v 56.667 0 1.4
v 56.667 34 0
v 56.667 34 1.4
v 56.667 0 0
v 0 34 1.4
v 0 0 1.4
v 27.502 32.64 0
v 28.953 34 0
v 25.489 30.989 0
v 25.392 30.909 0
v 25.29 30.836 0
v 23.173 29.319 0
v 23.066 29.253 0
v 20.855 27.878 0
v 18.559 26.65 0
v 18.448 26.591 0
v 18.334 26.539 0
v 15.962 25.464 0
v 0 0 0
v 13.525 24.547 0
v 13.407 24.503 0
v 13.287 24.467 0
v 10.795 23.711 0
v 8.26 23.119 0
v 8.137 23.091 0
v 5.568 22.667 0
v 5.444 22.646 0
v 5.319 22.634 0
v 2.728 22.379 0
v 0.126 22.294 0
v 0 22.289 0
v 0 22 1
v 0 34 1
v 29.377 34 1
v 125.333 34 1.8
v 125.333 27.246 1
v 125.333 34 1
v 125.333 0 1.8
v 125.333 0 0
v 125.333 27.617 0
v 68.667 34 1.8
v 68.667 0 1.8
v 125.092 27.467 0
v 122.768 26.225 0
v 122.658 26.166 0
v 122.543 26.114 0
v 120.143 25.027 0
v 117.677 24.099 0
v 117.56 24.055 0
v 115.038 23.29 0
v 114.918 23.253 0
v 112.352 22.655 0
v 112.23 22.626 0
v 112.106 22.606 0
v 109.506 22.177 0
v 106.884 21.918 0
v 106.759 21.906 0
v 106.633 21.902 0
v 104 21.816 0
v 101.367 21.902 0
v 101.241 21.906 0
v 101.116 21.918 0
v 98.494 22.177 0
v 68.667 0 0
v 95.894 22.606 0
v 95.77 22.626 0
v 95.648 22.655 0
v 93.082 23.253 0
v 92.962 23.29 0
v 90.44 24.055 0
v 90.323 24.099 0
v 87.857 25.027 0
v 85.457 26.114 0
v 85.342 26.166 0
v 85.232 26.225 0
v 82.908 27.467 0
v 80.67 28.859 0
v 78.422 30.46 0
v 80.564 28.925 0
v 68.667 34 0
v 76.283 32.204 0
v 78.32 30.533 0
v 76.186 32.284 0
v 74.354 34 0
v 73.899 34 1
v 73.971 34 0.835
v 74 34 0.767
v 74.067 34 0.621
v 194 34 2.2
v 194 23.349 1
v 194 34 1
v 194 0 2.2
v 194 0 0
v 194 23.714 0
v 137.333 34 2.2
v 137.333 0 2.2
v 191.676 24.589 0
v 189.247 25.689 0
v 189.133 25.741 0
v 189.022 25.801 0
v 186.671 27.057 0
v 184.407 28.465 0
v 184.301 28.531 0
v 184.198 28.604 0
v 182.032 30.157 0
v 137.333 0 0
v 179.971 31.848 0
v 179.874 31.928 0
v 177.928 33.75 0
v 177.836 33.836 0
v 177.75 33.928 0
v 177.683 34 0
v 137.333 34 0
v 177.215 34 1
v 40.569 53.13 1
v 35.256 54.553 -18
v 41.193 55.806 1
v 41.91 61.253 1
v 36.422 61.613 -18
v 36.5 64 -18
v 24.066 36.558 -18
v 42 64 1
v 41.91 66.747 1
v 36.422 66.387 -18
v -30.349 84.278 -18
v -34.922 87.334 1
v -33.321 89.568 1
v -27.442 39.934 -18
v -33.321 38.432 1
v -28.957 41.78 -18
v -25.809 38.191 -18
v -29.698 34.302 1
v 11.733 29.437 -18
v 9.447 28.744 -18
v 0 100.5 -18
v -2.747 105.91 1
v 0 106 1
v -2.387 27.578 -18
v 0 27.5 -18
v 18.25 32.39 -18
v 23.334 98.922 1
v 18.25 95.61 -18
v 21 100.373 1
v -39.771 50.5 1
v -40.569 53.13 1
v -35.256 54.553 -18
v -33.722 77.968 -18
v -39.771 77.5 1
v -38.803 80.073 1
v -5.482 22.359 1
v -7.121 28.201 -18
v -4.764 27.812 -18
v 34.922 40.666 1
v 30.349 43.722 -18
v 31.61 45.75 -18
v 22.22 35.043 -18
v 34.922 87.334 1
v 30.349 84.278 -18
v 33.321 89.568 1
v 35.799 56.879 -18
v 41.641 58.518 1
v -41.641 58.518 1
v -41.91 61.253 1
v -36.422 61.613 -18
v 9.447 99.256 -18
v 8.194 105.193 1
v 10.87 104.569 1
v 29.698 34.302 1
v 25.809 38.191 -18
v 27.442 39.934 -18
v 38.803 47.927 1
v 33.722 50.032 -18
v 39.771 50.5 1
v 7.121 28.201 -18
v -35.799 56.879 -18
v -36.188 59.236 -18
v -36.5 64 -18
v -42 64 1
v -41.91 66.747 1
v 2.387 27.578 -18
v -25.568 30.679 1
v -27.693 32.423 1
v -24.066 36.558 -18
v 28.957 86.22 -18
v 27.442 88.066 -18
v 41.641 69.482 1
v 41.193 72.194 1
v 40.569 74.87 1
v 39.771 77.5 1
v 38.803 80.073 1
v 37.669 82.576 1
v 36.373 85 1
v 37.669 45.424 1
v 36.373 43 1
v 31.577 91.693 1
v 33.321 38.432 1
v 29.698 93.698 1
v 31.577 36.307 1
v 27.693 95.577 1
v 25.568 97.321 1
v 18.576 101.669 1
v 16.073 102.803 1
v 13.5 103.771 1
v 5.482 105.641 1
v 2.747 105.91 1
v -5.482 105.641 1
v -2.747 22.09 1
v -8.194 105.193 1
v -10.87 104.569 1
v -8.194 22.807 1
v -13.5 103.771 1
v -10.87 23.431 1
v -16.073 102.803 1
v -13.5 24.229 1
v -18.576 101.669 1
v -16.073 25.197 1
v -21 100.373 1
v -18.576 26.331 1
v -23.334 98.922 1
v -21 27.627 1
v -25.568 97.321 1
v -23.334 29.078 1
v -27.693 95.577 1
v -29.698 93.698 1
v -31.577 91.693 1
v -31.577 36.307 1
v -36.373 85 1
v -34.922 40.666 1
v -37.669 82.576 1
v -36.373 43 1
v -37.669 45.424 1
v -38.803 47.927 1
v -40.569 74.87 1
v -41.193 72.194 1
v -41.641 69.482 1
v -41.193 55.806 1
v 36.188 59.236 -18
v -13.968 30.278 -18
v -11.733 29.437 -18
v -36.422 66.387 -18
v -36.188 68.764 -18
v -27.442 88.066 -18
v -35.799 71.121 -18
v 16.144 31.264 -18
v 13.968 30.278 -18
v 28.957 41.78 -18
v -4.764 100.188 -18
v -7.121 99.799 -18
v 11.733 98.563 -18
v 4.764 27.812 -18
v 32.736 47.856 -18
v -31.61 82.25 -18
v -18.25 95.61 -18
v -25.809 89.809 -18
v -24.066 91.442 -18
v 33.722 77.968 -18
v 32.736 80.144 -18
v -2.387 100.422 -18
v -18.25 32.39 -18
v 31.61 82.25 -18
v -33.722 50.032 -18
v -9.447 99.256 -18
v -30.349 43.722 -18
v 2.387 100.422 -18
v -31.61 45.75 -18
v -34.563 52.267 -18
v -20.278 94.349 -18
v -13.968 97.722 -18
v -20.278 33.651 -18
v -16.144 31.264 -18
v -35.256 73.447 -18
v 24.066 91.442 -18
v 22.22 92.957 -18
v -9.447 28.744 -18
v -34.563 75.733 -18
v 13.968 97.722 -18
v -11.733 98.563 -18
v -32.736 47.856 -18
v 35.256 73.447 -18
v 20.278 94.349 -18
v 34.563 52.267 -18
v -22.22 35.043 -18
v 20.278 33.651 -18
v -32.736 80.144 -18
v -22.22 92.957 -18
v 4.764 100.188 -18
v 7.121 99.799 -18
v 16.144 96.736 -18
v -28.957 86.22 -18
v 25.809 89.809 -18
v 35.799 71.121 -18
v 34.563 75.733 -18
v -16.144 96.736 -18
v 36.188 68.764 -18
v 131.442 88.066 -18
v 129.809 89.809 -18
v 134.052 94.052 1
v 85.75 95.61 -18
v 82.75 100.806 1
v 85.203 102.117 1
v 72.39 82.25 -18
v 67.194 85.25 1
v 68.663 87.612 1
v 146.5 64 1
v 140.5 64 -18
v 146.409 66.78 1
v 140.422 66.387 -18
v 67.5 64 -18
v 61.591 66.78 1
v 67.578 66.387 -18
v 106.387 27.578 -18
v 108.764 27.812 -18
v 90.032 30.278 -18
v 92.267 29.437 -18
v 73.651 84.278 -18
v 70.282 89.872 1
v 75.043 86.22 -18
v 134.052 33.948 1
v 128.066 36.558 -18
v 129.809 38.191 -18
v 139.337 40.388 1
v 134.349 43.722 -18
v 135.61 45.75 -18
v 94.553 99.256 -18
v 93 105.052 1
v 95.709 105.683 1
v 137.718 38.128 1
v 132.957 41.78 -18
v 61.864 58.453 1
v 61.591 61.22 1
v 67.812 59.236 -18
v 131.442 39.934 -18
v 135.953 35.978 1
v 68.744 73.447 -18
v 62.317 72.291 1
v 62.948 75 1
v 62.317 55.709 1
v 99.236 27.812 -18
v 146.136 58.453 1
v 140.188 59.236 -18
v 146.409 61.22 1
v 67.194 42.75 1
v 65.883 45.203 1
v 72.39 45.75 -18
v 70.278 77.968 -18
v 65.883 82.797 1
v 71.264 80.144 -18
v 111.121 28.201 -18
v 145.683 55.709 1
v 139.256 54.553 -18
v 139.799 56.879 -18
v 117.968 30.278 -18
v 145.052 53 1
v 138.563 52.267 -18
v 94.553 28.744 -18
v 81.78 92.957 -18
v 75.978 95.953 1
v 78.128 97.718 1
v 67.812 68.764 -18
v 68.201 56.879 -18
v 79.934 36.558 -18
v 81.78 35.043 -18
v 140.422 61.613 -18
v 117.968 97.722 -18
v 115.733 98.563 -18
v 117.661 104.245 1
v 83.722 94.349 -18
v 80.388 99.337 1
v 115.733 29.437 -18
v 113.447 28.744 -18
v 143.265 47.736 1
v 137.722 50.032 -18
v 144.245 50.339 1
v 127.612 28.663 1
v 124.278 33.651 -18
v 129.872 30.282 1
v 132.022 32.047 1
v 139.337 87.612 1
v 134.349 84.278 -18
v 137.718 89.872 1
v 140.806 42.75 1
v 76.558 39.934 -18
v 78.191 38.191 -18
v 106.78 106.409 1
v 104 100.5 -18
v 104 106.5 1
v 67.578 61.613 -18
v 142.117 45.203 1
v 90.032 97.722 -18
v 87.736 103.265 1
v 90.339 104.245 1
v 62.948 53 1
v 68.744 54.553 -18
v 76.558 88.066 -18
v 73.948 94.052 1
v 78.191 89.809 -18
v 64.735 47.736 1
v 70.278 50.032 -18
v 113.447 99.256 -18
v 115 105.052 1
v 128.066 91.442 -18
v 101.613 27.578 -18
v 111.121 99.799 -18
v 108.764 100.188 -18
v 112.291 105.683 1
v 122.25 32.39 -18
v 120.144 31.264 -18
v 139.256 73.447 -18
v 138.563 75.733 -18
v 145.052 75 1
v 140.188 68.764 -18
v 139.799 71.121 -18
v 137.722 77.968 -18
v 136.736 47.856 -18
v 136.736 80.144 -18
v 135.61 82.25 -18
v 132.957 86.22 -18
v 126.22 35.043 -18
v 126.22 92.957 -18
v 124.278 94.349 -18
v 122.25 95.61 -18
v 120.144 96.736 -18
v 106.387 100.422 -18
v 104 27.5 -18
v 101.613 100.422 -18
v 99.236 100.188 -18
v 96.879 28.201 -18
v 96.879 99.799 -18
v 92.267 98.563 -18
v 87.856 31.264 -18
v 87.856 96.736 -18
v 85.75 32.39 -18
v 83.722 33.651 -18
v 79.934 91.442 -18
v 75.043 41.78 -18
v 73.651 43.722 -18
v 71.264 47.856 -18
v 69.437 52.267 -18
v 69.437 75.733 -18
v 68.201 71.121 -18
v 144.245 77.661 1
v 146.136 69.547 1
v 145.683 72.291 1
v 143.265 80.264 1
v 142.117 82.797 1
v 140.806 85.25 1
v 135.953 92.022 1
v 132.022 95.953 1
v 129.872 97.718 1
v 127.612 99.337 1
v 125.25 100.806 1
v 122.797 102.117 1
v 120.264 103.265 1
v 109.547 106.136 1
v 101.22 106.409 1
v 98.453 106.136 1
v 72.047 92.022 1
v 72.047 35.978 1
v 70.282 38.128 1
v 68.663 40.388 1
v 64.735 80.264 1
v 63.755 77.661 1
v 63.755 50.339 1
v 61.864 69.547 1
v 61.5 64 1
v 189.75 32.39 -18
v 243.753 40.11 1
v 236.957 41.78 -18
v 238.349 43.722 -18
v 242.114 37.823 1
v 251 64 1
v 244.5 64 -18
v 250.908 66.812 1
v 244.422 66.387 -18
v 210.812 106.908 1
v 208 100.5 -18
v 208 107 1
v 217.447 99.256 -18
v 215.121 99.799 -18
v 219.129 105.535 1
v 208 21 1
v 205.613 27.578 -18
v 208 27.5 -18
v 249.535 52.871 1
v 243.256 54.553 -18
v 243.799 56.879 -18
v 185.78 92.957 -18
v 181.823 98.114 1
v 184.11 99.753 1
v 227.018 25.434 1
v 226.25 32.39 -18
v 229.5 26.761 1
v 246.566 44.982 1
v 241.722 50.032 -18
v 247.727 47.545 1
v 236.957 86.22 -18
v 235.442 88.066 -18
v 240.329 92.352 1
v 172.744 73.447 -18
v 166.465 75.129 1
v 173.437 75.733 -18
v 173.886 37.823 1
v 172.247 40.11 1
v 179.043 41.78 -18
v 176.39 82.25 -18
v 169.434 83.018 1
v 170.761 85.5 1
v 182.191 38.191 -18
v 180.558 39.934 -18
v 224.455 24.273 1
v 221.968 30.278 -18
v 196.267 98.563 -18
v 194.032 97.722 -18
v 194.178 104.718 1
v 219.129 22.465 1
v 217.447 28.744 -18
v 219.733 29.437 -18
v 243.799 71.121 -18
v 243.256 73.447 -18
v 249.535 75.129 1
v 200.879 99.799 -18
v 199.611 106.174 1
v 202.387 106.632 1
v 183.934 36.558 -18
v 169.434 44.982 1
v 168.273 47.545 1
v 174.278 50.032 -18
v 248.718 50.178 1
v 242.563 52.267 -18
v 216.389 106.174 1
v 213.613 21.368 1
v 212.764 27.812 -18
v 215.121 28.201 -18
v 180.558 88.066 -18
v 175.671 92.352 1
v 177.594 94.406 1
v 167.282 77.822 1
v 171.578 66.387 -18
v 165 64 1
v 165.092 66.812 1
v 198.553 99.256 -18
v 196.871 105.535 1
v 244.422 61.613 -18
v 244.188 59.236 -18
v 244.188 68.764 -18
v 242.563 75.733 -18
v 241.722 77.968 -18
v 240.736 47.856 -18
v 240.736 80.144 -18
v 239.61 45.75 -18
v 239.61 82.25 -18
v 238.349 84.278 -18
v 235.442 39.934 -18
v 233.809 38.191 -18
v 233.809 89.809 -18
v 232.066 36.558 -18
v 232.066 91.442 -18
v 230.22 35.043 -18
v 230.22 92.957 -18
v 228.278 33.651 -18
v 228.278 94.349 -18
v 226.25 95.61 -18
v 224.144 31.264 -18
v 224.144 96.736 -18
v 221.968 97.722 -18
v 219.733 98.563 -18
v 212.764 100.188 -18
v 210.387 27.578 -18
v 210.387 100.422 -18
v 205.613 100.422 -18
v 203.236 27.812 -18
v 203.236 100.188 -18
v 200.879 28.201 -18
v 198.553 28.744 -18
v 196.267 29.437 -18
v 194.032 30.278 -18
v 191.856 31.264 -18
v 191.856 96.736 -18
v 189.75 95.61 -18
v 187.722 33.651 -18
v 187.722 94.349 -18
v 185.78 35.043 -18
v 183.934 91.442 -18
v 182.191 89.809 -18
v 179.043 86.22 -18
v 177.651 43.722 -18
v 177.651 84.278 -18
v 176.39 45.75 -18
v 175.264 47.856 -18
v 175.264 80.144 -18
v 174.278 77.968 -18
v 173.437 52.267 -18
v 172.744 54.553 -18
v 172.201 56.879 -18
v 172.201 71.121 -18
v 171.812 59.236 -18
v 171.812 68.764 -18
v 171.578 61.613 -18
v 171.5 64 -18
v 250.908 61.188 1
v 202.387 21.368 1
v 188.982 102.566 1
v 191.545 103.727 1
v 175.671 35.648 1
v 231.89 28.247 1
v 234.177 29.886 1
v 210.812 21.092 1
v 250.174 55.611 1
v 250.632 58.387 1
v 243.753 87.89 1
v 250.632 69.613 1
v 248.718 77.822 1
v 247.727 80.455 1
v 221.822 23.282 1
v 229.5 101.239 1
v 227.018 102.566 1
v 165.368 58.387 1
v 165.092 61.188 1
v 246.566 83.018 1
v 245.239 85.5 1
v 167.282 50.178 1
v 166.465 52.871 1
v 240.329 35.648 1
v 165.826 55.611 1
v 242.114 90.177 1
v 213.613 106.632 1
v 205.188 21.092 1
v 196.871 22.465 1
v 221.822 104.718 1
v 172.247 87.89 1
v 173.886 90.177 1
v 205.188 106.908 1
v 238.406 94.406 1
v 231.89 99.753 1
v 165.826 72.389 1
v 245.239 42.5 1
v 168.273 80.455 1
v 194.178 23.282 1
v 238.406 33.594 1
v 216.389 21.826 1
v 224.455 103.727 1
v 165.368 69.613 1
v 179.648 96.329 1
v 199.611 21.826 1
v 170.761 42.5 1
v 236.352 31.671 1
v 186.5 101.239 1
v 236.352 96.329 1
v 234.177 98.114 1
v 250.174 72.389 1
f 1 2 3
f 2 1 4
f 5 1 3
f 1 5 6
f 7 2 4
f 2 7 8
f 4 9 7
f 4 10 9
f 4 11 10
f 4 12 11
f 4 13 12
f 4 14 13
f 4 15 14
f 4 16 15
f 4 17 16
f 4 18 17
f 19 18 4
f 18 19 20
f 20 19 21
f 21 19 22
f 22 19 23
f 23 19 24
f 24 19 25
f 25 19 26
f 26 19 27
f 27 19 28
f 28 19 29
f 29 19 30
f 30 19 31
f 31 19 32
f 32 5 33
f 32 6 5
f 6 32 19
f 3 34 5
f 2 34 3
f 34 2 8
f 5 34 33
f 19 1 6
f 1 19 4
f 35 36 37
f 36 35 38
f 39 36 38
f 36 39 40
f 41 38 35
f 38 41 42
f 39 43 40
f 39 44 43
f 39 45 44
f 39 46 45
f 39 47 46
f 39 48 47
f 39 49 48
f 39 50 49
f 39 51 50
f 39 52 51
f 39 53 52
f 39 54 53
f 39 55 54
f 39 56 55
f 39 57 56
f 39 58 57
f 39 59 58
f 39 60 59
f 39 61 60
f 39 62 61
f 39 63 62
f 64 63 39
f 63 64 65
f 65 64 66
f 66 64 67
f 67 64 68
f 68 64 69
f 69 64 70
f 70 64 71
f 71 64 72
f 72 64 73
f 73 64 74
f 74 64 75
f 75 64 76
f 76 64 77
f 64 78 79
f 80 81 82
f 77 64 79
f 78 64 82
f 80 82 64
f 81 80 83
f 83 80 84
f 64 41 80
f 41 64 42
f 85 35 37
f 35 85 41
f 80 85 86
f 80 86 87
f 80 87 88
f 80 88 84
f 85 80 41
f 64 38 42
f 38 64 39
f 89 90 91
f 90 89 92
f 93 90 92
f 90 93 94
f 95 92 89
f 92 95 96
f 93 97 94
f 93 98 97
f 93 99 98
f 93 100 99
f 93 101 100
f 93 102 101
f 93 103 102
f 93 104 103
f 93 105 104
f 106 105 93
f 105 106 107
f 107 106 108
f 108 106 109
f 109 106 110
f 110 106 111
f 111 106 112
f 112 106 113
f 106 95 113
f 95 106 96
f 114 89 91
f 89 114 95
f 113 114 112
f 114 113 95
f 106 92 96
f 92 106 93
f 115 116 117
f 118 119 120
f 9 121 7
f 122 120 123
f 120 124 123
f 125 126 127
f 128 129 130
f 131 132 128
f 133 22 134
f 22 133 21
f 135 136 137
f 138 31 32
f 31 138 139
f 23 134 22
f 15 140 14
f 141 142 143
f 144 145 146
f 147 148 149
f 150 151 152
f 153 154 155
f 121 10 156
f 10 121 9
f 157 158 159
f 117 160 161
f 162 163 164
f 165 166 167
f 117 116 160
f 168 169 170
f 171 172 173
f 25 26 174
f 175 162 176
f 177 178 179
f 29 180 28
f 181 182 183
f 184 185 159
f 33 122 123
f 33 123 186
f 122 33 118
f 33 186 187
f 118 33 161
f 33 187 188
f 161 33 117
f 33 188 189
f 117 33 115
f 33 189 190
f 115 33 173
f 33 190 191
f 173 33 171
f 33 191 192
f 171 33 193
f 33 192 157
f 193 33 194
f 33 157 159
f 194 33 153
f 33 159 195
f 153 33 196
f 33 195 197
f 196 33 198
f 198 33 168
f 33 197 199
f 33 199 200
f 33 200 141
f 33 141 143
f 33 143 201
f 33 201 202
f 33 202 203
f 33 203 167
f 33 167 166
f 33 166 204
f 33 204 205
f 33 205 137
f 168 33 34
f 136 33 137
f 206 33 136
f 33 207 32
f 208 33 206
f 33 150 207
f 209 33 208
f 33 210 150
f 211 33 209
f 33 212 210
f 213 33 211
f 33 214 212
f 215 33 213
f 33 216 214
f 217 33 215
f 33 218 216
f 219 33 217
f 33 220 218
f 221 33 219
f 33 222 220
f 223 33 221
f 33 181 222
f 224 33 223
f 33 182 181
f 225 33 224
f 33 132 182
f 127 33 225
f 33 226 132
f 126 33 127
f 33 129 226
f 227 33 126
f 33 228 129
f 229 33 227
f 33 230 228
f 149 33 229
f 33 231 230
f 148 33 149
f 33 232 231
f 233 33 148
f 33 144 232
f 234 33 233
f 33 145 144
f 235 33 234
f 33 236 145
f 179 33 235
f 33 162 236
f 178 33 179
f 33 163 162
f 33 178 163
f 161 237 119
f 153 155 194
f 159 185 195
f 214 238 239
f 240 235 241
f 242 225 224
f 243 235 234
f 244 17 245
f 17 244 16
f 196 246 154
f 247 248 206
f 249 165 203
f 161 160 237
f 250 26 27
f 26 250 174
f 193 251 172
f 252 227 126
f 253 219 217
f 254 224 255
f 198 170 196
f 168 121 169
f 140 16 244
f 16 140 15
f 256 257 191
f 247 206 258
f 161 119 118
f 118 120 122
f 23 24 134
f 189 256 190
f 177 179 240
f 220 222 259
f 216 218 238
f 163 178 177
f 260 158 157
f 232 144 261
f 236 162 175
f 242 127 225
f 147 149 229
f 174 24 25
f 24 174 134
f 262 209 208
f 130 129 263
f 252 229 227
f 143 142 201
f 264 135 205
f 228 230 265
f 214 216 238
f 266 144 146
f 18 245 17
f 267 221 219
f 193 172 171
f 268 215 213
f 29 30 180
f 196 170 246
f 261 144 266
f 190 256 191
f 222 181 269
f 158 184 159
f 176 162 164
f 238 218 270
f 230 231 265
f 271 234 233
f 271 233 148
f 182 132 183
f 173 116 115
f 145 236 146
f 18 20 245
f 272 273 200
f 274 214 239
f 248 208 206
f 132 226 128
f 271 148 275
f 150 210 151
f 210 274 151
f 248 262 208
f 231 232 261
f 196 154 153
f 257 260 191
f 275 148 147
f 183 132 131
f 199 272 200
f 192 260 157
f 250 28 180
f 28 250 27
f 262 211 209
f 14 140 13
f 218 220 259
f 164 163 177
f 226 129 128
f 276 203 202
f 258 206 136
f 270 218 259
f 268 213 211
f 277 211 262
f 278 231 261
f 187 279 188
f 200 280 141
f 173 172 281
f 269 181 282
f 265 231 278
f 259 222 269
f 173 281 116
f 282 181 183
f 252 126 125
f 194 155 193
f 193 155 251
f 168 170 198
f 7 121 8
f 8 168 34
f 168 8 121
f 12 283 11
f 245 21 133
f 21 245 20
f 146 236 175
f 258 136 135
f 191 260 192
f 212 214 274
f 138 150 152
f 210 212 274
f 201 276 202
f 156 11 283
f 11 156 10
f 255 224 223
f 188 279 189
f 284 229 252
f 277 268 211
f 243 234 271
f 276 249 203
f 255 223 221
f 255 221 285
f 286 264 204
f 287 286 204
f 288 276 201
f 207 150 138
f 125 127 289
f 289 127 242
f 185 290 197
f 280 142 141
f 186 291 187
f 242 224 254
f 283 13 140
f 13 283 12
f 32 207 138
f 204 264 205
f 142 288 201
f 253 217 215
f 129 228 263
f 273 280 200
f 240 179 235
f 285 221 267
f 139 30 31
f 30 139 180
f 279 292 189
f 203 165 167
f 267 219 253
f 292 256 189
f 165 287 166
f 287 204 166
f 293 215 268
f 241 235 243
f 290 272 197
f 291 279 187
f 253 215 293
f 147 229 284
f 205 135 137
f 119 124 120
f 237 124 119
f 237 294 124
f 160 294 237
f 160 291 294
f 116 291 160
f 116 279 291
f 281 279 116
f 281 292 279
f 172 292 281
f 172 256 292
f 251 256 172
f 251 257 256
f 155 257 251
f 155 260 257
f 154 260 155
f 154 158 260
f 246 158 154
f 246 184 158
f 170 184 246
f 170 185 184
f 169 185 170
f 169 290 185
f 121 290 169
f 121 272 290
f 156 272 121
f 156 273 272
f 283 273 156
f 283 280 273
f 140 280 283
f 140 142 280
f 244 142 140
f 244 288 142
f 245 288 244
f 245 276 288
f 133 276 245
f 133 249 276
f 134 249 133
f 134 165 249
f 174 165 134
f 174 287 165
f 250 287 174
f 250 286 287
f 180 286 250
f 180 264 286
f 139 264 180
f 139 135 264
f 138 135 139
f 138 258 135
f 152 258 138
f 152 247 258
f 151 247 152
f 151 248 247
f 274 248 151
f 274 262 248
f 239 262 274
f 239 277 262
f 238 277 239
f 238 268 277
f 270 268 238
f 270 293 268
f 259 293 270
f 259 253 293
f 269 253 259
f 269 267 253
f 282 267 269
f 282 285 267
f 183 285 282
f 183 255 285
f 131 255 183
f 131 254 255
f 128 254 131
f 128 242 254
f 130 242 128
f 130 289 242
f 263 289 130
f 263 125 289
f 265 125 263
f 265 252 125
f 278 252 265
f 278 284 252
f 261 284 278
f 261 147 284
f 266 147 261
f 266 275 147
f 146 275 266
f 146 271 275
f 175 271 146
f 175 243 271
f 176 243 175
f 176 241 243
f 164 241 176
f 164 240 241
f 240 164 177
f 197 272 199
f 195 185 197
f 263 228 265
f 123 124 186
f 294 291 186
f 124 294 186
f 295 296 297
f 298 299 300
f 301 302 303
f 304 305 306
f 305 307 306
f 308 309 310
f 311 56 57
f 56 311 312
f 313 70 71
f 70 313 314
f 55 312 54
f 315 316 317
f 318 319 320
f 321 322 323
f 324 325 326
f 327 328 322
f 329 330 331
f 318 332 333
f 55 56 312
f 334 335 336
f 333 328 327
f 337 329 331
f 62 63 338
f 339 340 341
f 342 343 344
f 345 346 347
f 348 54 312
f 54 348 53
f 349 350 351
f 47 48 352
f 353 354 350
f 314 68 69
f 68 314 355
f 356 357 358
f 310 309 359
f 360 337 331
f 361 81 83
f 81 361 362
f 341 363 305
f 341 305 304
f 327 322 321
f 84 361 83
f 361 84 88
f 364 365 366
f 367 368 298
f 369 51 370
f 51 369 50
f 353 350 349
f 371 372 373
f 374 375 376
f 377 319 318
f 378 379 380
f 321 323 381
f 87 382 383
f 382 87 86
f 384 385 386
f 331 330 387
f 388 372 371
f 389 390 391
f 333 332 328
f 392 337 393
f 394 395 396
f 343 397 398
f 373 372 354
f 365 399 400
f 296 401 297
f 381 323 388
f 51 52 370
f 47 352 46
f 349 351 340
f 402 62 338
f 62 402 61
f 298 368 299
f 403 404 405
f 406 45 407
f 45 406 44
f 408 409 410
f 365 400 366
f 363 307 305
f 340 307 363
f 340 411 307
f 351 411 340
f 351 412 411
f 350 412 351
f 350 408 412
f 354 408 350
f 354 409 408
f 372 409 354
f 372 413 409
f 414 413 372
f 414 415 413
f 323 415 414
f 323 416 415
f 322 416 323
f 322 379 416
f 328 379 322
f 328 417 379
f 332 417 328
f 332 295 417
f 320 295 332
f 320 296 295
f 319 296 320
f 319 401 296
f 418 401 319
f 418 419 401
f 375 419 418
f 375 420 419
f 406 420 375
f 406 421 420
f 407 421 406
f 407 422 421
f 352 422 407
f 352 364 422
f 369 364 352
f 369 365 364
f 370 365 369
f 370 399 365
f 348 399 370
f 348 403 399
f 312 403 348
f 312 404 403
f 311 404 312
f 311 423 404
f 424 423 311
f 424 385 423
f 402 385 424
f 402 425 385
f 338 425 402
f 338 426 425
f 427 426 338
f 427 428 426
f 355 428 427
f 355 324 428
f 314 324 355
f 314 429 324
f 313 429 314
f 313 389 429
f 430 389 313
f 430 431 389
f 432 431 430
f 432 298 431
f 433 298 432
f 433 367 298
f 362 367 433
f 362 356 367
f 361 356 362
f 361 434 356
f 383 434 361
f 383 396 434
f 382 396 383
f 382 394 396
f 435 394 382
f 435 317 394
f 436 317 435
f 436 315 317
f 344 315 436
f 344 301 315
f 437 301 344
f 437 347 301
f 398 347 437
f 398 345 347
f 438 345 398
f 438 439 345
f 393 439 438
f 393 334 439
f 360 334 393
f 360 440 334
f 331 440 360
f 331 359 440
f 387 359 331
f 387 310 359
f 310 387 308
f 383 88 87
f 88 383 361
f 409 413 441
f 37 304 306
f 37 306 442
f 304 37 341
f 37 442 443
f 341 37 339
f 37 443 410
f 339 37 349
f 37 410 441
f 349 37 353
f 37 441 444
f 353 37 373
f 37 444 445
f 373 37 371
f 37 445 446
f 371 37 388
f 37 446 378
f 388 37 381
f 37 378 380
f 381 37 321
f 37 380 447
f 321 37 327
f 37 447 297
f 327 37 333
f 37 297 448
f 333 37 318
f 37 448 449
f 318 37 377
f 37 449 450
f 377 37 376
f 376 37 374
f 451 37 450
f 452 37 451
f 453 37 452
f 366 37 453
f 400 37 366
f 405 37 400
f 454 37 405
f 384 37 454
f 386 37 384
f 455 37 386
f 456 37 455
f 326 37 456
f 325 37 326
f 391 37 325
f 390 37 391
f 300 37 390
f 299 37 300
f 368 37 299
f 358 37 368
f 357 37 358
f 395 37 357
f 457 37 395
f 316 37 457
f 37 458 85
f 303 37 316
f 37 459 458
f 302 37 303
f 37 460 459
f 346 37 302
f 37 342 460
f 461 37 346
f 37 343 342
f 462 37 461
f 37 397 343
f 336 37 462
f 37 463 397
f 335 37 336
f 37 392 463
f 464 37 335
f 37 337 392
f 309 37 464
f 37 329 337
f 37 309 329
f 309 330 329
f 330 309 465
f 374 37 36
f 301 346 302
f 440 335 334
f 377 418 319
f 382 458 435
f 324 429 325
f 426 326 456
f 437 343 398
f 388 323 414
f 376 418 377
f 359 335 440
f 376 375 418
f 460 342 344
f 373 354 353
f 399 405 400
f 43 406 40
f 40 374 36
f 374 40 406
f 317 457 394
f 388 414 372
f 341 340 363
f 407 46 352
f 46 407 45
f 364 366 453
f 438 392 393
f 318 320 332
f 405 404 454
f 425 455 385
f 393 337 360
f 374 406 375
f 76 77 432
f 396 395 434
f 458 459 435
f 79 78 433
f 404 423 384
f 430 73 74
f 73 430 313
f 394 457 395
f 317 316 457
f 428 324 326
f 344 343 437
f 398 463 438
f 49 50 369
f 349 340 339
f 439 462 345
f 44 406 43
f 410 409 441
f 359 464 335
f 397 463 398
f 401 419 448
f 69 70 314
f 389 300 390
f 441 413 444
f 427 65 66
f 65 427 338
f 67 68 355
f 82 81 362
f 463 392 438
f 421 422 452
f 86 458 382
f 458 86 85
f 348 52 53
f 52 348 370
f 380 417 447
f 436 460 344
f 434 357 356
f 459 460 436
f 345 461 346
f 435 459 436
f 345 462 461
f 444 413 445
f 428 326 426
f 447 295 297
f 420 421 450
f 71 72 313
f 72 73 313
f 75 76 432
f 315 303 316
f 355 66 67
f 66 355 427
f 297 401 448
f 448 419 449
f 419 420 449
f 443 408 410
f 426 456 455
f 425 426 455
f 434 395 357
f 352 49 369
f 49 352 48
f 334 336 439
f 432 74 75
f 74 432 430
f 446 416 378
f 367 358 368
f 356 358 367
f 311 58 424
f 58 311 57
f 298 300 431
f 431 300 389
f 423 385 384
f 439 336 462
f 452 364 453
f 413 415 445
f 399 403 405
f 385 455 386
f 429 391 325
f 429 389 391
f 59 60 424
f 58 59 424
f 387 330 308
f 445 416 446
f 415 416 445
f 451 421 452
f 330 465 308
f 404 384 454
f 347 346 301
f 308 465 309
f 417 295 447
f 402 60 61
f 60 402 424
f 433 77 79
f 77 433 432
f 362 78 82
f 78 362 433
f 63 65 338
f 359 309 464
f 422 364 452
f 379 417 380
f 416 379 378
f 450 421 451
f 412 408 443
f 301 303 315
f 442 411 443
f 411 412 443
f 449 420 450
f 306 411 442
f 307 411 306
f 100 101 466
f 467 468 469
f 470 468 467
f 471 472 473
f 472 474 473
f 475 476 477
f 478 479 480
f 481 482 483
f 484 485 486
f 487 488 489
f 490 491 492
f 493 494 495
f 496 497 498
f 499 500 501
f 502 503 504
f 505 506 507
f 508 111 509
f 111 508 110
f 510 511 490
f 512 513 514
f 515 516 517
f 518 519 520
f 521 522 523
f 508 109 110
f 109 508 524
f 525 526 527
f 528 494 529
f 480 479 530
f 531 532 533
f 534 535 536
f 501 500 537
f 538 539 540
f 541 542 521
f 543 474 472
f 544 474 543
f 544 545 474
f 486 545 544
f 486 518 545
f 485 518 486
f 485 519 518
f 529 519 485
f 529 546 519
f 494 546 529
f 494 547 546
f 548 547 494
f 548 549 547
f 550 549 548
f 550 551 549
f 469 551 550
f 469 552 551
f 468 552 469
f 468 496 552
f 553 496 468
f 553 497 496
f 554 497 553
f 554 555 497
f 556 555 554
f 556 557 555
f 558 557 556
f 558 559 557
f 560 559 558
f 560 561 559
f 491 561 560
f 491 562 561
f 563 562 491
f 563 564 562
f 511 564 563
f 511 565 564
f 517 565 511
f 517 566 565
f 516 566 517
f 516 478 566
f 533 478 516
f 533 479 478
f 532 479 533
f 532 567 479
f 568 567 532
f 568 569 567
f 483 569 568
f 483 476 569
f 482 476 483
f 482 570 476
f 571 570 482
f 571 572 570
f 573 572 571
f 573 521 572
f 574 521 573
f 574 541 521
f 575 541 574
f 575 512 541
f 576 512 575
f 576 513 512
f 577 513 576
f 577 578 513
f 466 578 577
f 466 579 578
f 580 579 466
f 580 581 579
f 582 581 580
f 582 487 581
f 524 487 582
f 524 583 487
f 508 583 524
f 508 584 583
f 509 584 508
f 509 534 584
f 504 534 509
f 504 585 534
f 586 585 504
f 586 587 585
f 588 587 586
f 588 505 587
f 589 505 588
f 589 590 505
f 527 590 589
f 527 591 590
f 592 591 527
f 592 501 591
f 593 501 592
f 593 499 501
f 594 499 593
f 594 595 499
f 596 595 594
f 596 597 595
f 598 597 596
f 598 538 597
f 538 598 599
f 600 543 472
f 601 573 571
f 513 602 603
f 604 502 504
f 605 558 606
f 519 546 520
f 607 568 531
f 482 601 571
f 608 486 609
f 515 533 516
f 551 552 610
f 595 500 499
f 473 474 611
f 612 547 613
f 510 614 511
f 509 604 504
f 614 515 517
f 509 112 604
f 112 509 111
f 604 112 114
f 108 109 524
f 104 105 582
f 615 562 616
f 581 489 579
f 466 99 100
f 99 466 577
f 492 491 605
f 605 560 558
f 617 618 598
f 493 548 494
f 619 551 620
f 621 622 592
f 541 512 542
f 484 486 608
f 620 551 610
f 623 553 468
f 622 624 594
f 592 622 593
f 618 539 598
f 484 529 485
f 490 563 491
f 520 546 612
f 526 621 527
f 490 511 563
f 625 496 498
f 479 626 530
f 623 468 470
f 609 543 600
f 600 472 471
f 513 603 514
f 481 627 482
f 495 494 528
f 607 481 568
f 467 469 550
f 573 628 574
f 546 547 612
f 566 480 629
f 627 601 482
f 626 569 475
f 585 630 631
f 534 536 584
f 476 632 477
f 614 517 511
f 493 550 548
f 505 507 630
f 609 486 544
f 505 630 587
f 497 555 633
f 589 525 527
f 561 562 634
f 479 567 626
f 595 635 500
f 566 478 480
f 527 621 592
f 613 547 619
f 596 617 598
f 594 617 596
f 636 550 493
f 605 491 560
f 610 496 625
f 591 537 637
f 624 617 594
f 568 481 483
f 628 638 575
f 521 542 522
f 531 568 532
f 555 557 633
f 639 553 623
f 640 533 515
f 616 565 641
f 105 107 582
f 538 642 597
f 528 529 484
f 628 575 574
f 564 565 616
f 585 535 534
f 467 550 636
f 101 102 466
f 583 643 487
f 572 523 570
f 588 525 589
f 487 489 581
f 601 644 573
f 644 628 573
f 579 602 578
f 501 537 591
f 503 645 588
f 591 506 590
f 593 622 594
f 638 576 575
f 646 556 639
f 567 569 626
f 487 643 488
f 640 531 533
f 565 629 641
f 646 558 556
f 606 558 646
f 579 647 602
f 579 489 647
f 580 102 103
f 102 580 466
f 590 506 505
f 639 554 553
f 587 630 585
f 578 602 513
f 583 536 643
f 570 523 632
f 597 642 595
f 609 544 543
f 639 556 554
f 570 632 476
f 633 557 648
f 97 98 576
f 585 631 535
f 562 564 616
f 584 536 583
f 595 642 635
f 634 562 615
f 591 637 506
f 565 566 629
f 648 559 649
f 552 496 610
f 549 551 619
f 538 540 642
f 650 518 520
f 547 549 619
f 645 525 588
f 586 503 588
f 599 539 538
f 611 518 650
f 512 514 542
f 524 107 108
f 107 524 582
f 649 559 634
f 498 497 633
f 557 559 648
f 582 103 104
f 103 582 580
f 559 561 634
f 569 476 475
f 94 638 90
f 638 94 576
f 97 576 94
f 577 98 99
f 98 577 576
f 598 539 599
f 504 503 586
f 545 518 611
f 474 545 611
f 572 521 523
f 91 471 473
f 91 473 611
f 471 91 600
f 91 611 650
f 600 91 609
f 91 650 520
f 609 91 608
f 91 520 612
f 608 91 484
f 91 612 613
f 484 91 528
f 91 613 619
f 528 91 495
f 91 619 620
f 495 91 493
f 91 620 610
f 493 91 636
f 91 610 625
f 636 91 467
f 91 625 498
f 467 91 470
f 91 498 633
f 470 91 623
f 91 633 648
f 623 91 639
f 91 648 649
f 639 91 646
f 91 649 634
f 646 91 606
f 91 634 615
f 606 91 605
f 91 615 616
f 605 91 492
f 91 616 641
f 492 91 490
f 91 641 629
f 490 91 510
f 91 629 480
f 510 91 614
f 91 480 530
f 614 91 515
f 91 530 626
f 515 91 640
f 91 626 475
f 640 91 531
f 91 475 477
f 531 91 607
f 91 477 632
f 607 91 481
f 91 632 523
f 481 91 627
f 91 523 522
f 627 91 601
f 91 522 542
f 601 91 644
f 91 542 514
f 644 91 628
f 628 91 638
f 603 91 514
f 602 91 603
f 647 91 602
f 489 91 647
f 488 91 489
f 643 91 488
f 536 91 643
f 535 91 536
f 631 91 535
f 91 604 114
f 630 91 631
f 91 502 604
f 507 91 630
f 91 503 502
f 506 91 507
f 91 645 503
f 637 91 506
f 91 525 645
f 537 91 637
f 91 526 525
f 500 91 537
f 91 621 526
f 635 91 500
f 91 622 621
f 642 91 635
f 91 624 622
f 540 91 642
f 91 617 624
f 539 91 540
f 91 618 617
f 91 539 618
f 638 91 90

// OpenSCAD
// file: ../../lib/project/util.scad
// lib/project/util.scad

module rounded_rect_2d(size = [10, 10], r = 2) {
  x = size[0];
  y = size[1];
  rr = min(r, min(x, y) / 2);

  hull() {
    for (sx = [-1, 1], sy = [-1, 1]) {
      translate([sx * (x / 2 - rr), sy * (y / 2 - rr)])
        circle(r = rr);
    }
  }
}
// file: ../../lib/project/params.scad
// lib/project/params.scad
// Shared project parameters for the final tray and all fit-test models.

debug = false;

// Main tray footprint.
tray_w = 286;
tray_d = 150;
tray_corner_r = 15;

// Top tray shell.
tray_floor_t = 2.4;
tray_wall_h = 9;
top_wall_w = 10;

// Underside support lip and rear support section.
support_lip_drop = 10;
support_lip_w = 10;
rear_gap_w = 28;
rear_tongue_w = 170;
rear_tongue_depth = 34;
rear_tongue_t = 1.8;

// Cup holder location and plug geometry.
cup_spacing = 118;
cup_y_from_front = 72;
plug_top_d = 85;
plug_bottom_d = 73;
plug_h = 62;
plug_clearance_z = 0;

// Fit-test defaults.
test_plug_top_ds = [84, 85, 86];
test_spacing_values = [116, 118, 120];
test_lip_drop_values = [8, 10, 12];
test_rear_tongue_ts = [1.4, 1.8, 2.2];
test_frame_wall_w = 12;
test_front_zone_depth = 100;
test_rear_zone_depth = 56;
test_gap_section_w = 140;
test_coupon_spacing = 18;
// main file
use <../../lib/project/console_tray.scad>;
include <../../lib/project/params.scad>;

// Rear tongue thickness coupons.
for (i = [0 : len(test_rear_tongue_ts) - 1]) {
  translate([i * (rear_tongue_w / 3 + 12), 0, 0])
    cube([rear_tongue_w / 3, rear_tongue_depth, test_rear_tongue_ts[i]], center = false);
}

// Cup plug diameter coupons.
for (i = [0 : len(test_plug_top_ds) - 1]) {
  translate([i * (max(test_plug_top_ds) + 18), rear_tongue_depth + 30, 0])
    cup_holder_plug(
      top_d = test_plug_top_ds[i],
      bottom_d = plug_bottom_d,
      h = 18
    );
}
